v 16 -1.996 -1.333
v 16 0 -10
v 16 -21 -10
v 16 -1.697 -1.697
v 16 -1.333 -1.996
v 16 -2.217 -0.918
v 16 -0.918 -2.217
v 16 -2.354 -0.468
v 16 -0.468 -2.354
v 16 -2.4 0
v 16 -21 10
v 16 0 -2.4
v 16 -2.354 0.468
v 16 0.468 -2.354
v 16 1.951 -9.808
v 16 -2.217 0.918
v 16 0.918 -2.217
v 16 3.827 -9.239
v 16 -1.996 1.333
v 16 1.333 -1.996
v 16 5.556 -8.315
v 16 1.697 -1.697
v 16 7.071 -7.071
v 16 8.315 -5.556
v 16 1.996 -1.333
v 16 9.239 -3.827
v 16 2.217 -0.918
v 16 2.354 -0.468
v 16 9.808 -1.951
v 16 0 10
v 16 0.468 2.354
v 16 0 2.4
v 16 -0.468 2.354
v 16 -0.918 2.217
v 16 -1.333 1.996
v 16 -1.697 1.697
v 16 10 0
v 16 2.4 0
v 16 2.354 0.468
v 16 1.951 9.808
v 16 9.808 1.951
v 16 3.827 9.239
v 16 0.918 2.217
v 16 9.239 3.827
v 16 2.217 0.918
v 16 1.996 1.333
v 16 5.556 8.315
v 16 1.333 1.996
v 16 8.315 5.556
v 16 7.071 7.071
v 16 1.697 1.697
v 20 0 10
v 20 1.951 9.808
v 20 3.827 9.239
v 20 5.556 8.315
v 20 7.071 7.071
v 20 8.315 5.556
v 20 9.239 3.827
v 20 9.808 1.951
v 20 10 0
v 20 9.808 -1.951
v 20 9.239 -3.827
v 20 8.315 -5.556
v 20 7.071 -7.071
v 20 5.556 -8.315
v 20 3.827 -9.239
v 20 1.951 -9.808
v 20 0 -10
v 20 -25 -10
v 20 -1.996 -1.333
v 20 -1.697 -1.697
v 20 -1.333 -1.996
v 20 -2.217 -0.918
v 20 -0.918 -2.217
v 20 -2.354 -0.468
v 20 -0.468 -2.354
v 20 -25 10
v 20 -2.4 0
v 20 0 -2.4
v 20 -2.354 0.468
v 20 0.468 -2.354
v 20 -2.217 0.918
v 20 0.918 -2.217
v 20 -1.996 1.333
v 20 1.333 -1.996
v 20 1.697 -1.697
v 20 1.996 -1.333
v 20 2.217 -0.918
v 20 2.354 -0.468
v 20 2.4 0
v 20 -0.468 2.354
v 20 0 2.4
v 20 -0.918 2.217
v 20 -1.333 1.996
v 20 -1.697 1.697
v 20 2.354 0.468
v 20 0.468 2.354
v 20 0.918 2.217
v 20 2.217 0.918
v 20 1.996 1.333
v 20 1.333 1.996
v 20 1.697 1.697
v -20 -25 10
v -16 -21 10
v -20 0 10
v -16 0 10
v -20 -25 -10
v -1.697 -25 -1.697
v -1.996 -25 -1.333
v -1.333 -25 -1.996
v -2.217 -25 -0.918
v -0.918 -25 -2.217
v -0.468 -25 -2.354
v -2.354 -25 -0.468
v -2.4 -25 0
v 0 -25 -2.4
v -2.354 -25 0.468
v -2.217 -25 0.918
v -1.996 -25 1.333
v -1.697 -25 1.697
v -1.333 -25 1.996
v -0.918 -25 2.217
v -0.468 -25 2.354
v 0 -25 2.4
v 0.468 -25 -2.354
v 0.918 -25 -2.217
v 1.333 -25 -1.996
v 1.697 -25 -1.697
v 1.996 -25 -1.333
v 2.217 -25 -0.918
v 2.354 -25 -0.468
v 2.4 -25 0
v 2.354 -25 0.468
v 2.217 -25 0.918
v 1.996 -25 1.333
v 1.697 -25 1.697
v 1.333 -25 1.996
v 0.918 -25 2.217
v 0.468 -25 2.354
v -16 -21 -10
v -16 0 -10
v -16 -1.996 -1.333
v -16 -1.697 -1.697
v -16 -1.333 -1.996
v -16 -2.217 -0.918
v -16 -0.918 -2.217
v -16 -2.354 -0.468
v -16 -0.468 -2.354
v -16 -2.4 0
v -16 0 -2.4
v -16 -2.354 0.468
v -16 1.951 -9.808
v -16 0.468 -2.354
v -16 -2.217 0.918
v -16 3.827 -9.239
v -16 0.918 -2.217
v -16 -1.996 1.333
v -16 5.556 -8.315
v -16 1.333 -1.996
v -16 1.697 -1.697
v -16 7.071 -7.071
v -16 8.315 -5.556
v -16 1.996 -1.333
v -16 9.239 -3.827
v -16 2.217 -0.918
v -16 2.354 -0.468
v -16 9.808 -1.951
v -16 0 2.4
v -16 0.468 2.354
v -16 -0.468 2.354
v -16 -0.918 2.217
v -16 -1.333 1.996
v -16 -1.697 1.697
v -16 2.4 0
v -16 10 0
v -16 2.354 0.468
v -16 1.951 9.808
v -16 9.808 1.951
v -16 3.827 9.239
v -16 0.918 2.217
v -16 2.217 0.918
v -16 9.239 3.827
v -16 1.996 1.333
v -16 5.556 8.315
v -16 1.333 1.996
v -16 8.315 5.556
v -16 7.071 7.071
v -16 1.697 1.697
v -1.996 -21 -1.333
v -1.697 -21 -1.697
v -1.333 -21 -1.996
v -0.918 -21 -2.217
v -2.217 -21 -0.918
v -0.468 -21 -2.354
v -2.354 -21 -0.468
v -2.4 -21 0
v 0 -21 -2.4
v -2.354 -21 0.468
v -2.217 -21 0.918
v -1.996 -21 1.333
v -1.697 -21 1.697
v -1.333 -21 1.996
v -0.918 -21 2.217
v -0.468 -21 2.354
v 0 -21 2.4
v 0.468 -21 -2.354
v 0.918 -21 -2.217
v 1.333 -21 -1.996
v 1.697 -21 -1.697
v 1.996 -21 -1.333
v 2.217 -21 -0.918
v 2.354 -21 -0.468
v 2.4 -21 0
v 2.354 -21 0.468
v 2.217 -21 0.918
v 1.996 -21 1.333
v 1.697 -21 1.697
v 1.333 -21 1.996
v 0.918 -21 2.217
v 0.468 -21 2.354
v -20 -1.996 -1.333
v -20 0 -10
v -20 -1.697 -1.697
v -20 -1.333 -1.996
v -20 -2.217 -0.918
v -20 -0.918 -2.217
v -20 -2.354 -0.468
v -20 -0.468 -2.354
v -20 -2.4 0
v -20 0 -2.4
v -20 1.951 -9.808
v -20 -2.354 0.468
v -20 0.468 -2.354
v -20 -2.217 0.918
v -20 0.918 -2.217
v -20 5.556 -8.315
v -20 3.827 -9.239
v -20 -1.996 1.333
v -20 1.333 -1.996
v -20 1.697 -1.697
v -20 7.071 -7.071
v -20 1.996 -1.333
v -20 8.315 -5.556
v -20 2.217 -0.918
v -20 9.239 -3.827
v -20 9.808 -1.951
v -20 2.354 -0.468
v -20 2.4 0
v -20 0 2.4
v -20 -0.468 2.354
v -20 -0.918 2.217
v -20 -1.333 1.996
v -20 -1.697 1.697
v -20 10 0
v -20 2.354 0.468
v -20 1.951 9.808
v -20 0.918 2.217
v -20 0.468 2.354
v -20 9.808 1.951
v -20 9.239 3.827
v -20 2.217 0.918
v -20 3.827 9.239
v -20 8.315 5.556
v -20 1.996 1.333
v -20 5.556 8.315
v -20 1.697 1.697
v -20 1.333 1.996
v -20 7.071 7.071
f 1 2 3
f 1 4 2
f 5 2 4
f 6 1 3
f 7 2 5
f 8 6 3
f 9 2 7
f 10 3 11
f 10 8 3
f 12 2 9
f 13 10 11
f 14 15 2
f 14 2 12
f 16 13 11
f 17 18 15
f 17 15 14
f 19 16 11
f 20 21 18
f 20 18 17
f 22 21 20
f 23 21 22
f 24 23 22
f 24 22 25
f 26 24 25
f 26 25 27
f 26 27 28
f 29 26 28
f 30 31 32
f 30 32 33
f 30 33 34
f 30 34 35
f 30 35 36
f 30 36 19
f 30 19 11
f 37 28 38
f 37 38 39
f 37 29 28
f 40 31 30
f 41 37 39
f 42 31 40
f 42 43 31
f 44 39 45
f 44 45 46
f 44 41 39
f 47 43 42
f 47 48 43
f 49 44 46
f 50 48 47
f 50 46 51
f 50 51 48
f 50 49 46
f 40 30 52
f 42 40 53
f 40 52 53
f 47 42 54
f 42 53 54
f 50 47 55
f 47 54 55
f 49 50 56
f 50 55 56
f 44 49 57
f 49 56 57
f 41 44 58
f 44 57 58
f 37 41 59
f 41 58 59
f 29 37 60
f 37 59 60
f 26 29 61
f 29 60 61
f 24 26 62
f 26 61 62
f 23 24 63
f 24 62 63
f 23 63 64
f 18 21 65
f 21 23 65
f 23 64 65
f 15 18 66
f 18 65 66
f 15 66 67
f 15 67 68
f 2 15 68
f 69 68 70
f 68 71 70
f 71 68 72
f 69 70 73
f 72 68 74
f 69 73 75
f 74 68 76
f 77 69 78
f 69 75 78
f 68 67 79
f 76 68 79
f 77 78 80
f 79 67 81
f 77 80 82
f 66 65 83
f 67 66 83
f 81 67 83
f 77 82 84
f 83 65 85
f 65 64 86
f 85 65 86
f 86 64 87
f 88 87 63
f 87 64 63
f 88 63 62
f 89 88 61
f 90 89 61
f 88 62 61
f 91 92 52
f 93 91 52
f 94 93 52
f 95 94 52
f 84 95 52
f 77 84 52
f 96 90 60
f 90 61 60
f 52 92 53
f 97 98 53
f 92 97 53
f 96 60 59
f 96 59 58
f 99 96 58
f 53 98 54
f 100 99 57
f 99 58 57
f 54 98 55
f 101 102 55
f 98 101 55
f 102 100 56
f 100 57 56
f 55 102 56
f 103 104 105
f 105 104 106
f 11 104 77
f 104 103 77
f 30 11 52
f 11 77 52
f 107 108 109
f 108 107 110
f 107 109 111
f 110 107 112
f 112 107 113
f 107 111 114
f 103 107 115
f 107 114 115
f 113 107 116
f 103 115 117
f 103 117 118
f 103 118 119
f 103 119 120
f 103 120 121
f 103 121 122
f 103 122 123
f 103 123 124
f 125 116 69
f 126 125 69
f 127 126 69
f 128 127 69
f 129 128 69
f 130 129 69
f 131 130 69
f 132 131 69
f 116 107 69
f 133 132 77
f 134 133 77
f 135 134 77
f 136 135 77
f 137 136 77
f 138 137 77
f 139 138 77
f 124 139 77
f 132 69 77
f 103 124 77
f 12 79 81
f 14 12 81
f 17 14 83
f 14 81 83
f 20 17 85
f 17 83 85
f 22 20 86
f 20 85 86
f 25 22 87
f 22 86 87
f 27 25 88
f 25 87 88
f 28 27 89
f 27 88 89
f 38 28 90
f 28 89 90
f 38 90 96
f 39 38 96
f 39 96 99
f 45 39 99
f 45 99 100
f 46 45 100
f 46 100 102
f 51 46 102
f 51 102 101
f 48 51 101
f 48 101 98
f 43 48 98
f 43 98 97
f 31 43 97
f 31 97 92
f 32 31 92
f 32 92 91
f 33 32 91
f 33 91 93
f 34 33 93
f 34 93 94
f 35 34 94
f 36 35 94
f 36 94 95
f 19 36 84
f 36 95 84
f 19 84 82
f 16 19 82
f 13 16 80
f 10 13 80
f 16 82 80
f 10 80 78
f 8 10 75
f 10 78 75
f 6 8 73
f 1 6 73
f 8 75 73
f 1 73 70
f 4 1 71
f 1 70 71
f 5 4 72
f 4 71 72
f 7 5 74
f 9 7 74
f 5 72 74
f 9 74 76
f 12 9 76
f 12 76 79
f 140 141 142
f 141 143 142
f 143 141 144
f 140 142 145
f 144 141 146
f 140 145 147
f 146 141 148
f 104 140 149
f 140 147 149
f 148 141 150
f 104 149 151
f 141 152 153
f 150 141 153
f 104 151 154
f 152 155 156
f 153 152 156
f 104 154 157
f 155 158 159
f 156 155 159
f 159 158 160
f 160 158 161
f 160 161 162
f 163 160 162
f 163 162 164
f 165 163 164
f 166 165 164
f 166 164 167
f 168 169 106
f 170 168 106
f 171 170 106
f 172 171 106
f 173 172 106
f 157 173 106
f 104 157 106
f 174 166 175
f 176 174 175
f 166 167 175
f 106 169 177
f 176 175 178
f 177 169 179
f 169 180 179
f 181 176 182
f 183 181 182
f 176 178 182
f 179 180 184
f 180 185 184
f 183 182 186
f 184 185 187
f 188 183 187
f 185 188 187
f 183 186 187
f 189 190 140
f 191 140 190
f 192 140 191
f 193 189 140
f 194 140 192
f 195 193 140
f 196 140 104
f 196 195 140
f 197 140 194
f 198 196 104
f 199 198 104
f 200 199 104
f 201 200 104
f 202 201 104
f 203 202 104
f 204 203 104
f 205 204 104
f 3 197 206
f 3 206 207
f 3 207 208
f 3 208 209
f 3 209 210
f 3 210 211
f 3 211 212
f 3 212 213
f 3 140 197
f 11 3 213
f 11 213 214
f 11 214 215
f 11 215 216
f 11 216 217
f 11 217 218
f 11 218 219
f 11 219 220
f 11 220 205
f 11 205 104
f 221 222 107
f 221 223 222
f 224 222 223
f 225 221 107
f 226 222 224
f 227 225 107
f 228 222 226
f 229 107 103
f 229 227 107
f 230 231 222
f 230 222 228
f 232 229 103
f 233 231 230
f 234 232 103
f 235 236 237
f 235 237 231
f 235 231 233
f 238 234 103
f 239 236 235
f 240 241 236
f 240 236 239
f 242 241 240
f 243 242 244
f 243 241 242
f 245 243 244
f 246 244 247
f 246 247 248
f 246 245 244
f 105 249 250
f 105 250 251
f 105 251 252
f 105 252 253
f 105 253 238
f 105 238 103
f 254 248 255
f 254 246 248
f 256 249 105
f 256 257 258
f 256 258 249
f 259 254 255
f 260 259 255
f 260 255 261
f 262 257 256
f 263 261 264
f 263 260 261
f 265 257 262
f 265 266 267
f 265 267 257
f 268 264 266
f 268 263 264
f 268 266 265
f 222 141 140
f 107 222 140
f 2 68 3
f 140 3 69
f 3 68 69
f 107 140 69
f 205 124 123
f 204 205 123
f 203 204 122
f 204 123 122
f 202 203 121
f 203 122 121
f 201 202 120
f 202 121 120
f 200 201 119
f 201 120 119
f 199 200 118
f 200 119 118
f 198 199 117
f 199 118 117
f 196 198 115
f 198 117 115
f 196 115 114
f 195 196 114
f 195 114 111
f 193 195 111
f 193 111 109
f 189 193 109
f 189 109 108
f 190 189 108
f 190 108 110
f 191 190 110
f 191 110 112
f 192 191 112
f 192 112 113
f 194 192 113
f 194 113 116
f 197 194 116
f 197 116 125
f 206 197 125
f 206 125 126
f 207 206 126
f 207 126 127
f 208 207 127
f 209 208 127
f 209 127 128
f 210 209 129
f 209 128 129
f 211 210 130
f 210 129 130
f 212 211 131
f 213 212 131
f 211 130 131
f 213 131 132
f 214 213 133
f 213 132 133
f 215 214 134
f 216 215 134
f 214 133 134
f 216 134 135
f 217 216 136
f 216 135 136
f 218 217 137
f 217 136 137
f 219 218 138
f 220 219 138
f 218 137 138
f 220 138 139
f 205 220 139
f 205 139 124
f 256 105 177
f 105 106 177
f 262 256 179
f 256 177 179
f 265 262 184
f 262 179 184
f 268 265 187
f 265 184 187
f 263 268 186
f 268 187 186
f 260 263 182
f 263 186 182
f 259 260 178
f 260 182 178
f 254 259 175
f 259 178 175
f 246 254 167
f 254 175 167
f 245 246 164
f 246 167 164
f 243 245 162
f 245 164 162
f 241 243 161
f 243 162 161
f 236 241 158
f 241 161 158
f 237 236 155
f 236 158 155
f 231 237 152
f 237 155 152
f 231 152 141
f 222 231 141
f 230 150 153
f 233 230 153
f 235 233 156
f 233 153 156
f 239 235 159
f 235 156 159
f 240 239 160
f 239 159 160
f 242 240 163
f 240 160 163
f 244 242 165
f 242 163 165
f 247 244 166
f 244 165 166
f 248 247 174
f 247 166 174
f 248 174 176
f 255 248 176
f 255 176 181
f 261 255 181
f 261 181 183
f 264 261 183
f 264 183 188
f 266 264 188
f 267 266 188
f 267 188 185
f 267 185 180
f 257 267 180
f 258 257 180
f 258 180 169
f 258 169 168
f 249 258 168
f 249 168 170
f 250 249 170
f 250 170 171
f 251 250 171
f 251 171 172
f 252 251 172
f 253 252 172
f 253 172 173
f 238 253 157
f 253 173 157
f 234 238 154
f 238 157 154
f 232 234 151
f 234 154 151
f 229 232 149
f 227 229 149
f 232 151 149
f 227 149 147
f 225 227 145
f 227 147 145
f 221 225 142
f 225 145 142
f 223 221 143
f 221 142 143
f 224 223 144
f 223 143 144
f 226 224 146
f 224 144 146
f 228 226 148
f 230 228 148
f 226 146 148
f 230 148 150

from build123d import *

# Parameters (mm, degrees)
SHOULDER_DEPTH               = 20
SHELL_T                      = -4
SKETCH2_R                    = 2.4
PIVOT_HOLES_DEPTH            = 49.218253805
BASE_MOUNT_REACH             = 43.533
SKETCH4_R                    = 2.4
BASE_MOUNT_DIRECTION_2_DEPTH = 42.533119315


with BuildPart() as part:
    # Sketch1 → shoulder (new, symmetric)
    with BuildSketch(Plane(origin=(0, 0, 0), x_dir=(0, 0, -1), z_dir=(1, 0, 0))):
        with BuildLine():
            Line((10, 0), (10, -25))
            Line((10, -25), (-10, -25))
            Line((-10, -25), (-10, 0))
            ThreePointArc((-10, 0), (0, 10), (10, 0))
        make_face()
    extrude(amount=SHOULDER_DEPTH, both=True)

    # shell
    shell_openings = [part.faces().sort_by_distance(p)[0] for p in [
        (0, -12.5, -10),
        (0, -12.5, 10),
        (0, 10, 0),
    ]]
    offset(amount=SHELL_T, openings=shell_openings, kind=Kind.INTERSECTION)

    # Sketch2 → pivot holes (cut, through all)
    with BuildSketch(Plane(origin=(20, 0, 0), x_dir=(0, 0, -1), z_dir=(1, 0, 0))):
        Circle(SKETCH2_R)
    extrude(amount=-PIVOT_HOLES_DEPTH, mode=Mode.SUBTRACT)

    # Sketch4 → base mount (cut, up to next)
    with BuildSketch(Plane.XZ.offset(25), mode=Mode.PRIVATE) as base_mount_sk1:
        with Locations(Location((0, 0, 0), (0, 0, 90))):
            Circle(SKETCH4_R)
    base_mount_tool1 = extrude(base_mount_sk1.sketch, amount=-BASE_MOUNT_REACH, mode=Mode.PRIVATE) & part.part
    add(base_mount_tool1.solids().sort_by_distance((0, -25, 0))[0], mode=Mode.SUBTRACT)

    # Sketch4 → base mount direction 2 (cut)
    with BuildSketch(Plane.XZ.offset(25)):
        with Locations(Location((0, 0, 0), (0, 0, 90))):
            Circle(SKETCH4_R)
    extrude(amount=BASE_MOUNT_DIRECTION_2_DEPTH, mode=Mode.SUBTRACT)


solid = part.part
